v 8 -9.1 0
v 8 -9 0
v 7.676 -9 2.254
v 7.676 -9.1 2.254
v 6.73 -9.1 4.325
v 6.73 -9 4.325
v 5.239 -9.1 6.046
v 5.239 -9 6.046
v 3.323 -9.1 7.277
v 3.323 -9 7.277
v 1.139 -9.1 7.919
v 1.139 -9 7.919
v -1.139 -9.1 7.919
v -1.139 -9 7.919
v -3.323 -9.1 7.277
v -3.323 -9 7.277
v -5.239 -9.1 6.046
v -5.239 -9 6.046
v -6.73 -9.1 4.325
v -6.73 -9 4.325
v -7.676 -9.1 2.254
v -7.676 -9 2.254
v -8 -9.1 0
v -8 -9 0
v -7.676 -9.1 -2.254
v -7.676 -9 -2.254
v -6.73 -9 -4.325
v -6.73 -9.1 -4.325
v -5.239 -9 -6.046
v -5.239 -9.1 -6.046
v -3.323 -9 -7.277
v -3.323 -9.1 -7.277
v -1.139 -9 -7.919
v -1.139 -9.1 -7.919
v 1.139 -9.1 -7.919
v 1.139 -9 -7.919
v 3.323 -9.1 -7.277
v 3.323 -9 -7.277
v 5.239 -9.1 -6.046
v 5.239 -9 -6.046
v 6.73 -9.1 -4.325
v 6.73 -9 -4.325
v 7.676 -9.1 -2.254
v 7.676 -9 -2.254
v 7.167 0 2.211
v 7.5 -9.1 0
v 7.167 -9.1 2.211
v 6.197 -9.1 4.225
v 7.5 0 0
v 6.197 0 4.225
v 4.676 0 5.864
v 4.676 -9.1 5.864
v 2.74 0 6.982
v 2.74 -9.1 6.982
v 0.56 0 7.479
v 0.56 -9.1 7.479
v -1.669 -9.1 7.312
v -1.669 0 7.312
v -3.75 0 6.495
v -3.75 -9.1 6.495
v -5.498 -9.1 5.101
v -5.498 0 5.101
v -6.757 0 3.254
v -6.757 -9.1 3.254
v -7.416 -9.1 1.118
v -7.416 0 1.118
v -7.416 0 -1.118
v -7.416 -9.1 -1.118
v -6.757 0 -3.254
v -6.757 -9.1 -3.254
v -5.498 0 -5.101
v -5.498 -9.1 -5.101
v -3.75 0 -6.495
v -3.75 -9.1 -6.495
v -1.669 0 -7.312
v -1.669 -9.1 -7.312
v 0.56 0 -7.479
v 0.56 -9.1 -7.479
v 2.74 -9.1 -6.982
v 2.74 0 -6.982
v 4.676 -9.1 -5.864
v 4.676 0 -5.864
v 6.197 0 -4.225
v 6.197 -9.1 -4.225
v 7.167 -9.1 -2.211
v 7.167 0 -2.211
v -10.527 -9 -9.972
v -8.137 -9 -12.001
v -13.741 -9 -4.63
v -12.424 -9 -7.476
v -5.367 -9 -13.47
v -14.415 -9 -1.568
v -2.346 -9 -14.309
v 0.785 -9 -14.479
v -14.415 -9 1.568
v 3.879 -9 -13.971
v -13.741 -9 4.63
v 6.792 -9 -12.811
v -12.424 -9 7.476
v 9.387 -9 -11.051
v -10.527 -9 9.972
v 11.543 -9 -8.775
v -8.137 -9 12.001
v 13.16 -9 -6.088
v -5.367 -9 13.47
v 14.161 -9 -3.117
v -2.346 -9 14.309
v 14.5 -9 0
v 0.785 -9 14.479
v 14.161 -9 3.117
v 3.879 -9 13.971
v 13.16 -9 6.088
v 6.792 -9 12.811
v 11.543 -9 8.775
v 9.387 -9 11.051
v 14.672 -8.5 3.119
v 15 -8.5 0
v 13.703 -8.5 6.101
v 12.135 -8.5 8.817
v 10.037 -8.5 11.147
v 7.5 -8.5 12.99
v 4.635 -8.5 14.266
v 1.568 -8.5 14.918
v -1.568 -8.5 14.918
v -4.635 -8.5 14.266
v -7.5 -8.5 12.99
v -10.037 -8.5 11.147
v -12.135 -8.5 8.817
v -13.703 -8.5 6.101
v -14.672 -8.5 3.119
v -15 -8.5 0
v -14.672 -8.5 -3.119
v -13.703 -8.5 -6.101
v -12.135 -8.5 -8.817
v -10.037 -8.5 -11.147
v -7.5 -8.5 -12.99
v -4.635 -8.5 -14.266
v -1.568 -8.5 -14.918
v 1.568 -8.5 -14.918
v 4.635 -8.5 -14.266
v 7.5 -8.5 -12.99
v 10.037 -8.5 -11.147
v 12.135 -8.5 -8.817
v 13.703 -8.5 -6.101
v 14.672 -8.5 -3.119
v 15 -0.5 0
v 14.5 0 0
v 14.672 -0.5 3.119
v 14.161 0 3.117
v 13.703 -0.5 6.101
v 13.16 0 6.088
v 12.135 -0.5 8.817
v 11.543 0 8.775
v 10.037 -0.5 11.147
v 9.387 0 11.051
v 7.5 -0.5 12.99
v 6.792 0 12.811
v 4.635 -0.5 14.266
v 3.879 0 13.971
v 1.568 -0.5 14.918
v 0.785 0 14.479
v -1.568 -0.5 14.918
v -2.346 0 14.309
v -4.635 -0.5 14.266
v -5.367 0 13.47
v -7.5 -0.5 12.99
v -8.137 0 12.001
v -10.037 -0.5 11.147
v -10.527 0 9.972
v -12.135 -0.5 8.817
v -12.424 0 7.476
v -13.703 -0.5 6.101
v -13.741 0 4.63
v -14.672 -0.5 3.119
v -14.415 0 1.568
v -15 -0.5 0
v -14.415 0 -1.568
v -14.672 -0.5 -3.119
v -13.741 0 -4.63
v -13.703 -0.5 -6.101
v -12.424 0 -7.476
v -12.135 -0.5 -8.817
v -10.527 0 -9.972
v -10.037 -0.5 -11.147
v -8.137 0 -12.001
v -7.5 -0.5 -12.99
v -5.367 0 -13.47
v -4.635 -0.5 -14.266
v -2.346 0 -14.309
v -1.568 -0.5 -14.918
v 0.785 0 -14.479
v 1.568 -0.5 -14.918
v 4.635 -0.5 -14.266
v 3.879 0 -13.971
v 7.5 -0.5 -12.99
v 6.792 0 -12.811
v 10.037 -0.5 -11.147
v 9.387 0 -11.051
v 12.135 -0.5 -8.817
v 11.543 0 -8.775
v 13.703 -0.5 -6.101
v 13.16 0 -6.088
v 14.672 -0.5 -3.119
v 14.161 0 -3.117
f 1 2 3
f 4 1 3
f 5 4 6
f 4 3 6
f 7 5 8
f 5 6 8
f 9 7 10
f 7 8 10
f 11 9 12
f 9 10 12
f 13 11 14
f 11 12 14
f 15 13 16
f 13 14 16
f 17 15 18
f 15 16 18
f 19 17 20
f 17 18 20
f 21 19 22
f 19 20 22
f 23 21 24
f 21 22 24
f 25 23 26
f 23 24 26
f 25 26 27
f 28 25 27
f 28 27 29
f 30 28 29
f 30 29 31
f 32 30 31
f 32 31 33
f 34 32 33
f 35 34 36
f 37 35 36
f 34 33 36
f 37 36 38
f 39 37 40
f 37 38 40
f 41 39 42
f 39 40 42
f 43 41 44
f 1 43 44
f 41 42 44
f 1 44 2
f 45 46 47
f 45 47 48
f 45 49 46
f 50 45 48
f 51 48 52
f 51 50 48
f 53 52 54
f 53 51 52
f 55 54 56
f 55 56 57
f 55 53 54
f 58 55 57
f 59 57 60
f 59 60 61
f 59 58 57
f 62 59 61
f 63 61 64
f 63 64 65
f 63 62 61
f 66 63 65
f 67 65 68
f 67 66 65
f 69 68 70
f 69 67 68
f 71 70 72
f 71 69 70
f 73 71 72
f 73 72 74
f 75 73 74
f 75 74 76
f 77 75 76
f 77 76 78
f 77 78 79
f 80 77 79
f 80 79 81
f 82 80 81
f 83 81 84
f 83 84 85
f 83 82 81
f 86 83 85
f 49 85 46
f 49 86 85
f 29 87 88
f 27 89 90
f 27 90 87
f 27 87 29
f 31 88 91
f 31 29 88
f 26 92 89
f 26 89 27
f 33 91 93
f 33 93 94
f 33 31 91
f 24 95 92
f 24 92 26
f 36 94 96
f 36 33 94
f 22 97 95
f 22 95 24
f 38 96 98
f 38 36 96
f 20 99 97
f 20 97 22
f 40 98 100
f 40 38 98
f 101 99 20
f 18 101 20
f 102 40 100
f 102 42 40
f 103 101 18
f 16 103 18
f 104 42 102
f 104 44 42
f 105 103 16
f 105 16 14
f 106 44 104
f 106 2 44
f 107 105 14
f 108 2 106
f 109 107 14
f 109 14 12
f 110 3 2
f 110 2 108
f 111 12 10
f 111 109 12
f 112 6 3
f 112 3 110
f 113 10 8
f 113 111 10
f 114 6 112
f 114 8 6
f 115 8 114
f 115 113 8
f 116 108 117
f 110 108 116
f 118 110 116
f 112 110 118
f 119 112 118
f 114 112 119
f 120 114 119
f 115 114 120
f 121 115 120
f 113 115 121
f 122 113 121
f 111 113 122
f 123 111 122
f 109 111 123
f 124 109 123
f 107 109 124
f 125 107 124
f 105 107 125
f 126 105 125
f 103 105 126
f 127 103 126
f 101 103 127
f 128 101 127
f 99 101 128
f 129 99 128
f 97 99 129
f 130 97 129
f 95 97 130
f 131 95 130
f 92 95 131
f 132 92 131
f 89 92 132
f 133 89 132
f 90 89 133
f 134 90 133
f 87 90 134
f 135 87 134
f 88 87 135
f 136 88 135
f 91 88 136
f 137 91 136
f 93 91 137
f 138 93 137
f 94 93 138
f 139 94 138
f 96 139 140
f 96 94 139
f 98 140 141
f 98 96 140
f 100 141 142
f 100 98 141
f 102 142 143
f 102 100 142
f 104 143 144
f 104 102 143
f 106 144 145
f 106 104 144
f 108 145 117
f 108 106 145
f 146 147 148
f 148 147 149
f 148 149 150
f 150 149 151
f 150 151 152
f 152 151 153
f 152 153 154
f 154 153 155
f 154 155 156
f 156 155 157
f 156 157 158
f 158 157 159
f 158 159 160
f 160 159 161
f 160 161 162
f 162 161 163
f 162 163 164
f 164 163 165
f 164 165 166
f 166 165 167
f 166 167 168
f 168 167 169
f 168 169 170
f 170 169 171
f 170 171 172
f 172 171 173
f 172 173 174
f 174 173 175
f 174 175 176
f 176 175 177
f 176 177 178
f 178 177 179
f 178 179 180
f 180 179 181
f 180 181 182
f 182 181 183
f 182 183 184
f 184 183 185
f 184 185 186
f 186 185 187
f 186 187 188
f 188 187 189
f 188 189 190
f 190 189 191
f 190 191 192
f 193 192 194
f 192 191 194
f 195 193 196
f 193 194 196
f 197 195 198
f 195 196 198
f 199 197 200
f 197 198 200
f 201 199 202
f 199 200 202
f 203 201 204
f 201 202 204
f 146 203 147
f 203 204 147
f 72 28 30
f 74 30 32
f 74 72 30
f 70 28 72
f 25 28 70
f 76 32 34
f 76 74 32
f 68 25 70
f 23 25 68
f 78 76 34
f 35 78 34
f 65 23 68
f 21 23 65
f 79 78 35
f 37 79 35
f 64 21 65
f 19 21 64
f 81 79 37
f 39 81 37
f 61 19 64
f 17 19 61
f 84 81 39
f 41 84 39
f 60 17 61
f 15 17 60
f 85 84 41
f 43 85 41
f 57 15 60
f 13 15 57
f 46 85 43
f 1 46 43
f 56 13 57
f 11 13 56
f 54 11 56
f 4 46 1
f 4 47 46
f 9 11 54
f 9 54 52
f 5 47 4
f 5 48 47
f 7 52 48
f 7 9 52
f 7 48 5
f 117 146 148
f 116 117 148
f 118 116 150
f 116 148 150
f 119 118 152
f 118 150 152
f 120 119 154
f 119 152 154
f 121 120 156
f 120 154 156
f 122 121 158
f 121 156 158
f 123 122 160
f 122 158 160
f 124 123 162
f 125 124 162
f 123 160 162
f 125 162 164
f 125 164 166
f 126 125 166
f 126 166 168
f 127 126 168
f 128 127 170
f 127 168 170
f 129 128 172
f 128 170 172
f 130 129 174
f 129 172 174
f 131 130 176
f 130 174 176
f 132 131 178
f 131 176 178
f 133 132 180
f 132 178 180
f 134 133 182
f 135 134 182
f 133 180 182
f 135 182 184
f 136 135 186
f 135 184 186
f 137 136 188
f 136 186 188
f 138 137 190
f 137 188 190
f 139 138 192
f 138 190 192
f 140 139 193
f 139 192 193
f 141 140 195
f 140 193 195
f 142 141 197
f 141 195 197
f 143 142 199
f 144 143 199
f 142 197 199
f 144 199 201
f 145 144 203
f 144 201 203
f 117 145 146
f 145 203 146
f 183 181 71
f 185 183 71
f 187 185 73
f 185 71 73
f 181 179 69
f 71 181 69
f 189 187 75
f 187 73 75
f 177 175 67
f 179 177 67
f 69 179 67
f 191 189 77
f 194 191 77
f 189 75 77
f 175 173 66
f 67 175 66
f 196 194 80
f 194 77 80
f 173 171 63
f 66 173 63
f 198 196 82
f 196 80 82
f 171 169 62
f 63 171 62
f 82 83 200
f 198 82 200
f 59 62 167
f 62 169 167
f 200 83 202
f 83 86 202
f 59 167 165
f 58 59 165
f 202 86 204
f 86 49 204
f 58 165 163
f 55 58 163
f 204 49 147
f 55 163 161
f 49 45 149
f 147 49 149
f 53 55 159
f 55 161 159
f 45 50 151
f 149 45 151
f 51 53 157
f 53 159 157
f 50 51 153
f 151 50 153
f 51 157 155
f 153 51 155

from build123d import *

# Parameters (mm, degrees)
F0_R     = 15
F0_R_2   = 7.5
F1_DEPTH = 9
F2_SIZE  = 0.5
F3_R     = 8
F3_R_2   = 7.5
F4_DEPTH = 0.1


with BuildPart() as f1:
    # F0 (on Front) → F1 (new body)
    with BuildSketch(Plane.XZ):
        Circle(F0_R)
        Circle(F0_R_2, mode=Mode.SUBTRACT)
    extrude(amount=F1_DEPTH)

    # F2
    f2_edges = [f1.edges().sort_by_distance(p)[0] for p in [
        (-15, -9, 0),
        (15, -4.5, 0),
        (-15, 0, 0),
    ]]
    chamfer(f2_edges, length=F2_SIZE)

    # F3 (on face) → F4 (join)
    with BuildSketch(Plane.XZ.offset(9)):
        Circle(F3_R)
        Circle(F3_R_2, mode=Mode.SUBTRACT)
    extrude(amount=F4_DEPTH)


solid = f1.part
